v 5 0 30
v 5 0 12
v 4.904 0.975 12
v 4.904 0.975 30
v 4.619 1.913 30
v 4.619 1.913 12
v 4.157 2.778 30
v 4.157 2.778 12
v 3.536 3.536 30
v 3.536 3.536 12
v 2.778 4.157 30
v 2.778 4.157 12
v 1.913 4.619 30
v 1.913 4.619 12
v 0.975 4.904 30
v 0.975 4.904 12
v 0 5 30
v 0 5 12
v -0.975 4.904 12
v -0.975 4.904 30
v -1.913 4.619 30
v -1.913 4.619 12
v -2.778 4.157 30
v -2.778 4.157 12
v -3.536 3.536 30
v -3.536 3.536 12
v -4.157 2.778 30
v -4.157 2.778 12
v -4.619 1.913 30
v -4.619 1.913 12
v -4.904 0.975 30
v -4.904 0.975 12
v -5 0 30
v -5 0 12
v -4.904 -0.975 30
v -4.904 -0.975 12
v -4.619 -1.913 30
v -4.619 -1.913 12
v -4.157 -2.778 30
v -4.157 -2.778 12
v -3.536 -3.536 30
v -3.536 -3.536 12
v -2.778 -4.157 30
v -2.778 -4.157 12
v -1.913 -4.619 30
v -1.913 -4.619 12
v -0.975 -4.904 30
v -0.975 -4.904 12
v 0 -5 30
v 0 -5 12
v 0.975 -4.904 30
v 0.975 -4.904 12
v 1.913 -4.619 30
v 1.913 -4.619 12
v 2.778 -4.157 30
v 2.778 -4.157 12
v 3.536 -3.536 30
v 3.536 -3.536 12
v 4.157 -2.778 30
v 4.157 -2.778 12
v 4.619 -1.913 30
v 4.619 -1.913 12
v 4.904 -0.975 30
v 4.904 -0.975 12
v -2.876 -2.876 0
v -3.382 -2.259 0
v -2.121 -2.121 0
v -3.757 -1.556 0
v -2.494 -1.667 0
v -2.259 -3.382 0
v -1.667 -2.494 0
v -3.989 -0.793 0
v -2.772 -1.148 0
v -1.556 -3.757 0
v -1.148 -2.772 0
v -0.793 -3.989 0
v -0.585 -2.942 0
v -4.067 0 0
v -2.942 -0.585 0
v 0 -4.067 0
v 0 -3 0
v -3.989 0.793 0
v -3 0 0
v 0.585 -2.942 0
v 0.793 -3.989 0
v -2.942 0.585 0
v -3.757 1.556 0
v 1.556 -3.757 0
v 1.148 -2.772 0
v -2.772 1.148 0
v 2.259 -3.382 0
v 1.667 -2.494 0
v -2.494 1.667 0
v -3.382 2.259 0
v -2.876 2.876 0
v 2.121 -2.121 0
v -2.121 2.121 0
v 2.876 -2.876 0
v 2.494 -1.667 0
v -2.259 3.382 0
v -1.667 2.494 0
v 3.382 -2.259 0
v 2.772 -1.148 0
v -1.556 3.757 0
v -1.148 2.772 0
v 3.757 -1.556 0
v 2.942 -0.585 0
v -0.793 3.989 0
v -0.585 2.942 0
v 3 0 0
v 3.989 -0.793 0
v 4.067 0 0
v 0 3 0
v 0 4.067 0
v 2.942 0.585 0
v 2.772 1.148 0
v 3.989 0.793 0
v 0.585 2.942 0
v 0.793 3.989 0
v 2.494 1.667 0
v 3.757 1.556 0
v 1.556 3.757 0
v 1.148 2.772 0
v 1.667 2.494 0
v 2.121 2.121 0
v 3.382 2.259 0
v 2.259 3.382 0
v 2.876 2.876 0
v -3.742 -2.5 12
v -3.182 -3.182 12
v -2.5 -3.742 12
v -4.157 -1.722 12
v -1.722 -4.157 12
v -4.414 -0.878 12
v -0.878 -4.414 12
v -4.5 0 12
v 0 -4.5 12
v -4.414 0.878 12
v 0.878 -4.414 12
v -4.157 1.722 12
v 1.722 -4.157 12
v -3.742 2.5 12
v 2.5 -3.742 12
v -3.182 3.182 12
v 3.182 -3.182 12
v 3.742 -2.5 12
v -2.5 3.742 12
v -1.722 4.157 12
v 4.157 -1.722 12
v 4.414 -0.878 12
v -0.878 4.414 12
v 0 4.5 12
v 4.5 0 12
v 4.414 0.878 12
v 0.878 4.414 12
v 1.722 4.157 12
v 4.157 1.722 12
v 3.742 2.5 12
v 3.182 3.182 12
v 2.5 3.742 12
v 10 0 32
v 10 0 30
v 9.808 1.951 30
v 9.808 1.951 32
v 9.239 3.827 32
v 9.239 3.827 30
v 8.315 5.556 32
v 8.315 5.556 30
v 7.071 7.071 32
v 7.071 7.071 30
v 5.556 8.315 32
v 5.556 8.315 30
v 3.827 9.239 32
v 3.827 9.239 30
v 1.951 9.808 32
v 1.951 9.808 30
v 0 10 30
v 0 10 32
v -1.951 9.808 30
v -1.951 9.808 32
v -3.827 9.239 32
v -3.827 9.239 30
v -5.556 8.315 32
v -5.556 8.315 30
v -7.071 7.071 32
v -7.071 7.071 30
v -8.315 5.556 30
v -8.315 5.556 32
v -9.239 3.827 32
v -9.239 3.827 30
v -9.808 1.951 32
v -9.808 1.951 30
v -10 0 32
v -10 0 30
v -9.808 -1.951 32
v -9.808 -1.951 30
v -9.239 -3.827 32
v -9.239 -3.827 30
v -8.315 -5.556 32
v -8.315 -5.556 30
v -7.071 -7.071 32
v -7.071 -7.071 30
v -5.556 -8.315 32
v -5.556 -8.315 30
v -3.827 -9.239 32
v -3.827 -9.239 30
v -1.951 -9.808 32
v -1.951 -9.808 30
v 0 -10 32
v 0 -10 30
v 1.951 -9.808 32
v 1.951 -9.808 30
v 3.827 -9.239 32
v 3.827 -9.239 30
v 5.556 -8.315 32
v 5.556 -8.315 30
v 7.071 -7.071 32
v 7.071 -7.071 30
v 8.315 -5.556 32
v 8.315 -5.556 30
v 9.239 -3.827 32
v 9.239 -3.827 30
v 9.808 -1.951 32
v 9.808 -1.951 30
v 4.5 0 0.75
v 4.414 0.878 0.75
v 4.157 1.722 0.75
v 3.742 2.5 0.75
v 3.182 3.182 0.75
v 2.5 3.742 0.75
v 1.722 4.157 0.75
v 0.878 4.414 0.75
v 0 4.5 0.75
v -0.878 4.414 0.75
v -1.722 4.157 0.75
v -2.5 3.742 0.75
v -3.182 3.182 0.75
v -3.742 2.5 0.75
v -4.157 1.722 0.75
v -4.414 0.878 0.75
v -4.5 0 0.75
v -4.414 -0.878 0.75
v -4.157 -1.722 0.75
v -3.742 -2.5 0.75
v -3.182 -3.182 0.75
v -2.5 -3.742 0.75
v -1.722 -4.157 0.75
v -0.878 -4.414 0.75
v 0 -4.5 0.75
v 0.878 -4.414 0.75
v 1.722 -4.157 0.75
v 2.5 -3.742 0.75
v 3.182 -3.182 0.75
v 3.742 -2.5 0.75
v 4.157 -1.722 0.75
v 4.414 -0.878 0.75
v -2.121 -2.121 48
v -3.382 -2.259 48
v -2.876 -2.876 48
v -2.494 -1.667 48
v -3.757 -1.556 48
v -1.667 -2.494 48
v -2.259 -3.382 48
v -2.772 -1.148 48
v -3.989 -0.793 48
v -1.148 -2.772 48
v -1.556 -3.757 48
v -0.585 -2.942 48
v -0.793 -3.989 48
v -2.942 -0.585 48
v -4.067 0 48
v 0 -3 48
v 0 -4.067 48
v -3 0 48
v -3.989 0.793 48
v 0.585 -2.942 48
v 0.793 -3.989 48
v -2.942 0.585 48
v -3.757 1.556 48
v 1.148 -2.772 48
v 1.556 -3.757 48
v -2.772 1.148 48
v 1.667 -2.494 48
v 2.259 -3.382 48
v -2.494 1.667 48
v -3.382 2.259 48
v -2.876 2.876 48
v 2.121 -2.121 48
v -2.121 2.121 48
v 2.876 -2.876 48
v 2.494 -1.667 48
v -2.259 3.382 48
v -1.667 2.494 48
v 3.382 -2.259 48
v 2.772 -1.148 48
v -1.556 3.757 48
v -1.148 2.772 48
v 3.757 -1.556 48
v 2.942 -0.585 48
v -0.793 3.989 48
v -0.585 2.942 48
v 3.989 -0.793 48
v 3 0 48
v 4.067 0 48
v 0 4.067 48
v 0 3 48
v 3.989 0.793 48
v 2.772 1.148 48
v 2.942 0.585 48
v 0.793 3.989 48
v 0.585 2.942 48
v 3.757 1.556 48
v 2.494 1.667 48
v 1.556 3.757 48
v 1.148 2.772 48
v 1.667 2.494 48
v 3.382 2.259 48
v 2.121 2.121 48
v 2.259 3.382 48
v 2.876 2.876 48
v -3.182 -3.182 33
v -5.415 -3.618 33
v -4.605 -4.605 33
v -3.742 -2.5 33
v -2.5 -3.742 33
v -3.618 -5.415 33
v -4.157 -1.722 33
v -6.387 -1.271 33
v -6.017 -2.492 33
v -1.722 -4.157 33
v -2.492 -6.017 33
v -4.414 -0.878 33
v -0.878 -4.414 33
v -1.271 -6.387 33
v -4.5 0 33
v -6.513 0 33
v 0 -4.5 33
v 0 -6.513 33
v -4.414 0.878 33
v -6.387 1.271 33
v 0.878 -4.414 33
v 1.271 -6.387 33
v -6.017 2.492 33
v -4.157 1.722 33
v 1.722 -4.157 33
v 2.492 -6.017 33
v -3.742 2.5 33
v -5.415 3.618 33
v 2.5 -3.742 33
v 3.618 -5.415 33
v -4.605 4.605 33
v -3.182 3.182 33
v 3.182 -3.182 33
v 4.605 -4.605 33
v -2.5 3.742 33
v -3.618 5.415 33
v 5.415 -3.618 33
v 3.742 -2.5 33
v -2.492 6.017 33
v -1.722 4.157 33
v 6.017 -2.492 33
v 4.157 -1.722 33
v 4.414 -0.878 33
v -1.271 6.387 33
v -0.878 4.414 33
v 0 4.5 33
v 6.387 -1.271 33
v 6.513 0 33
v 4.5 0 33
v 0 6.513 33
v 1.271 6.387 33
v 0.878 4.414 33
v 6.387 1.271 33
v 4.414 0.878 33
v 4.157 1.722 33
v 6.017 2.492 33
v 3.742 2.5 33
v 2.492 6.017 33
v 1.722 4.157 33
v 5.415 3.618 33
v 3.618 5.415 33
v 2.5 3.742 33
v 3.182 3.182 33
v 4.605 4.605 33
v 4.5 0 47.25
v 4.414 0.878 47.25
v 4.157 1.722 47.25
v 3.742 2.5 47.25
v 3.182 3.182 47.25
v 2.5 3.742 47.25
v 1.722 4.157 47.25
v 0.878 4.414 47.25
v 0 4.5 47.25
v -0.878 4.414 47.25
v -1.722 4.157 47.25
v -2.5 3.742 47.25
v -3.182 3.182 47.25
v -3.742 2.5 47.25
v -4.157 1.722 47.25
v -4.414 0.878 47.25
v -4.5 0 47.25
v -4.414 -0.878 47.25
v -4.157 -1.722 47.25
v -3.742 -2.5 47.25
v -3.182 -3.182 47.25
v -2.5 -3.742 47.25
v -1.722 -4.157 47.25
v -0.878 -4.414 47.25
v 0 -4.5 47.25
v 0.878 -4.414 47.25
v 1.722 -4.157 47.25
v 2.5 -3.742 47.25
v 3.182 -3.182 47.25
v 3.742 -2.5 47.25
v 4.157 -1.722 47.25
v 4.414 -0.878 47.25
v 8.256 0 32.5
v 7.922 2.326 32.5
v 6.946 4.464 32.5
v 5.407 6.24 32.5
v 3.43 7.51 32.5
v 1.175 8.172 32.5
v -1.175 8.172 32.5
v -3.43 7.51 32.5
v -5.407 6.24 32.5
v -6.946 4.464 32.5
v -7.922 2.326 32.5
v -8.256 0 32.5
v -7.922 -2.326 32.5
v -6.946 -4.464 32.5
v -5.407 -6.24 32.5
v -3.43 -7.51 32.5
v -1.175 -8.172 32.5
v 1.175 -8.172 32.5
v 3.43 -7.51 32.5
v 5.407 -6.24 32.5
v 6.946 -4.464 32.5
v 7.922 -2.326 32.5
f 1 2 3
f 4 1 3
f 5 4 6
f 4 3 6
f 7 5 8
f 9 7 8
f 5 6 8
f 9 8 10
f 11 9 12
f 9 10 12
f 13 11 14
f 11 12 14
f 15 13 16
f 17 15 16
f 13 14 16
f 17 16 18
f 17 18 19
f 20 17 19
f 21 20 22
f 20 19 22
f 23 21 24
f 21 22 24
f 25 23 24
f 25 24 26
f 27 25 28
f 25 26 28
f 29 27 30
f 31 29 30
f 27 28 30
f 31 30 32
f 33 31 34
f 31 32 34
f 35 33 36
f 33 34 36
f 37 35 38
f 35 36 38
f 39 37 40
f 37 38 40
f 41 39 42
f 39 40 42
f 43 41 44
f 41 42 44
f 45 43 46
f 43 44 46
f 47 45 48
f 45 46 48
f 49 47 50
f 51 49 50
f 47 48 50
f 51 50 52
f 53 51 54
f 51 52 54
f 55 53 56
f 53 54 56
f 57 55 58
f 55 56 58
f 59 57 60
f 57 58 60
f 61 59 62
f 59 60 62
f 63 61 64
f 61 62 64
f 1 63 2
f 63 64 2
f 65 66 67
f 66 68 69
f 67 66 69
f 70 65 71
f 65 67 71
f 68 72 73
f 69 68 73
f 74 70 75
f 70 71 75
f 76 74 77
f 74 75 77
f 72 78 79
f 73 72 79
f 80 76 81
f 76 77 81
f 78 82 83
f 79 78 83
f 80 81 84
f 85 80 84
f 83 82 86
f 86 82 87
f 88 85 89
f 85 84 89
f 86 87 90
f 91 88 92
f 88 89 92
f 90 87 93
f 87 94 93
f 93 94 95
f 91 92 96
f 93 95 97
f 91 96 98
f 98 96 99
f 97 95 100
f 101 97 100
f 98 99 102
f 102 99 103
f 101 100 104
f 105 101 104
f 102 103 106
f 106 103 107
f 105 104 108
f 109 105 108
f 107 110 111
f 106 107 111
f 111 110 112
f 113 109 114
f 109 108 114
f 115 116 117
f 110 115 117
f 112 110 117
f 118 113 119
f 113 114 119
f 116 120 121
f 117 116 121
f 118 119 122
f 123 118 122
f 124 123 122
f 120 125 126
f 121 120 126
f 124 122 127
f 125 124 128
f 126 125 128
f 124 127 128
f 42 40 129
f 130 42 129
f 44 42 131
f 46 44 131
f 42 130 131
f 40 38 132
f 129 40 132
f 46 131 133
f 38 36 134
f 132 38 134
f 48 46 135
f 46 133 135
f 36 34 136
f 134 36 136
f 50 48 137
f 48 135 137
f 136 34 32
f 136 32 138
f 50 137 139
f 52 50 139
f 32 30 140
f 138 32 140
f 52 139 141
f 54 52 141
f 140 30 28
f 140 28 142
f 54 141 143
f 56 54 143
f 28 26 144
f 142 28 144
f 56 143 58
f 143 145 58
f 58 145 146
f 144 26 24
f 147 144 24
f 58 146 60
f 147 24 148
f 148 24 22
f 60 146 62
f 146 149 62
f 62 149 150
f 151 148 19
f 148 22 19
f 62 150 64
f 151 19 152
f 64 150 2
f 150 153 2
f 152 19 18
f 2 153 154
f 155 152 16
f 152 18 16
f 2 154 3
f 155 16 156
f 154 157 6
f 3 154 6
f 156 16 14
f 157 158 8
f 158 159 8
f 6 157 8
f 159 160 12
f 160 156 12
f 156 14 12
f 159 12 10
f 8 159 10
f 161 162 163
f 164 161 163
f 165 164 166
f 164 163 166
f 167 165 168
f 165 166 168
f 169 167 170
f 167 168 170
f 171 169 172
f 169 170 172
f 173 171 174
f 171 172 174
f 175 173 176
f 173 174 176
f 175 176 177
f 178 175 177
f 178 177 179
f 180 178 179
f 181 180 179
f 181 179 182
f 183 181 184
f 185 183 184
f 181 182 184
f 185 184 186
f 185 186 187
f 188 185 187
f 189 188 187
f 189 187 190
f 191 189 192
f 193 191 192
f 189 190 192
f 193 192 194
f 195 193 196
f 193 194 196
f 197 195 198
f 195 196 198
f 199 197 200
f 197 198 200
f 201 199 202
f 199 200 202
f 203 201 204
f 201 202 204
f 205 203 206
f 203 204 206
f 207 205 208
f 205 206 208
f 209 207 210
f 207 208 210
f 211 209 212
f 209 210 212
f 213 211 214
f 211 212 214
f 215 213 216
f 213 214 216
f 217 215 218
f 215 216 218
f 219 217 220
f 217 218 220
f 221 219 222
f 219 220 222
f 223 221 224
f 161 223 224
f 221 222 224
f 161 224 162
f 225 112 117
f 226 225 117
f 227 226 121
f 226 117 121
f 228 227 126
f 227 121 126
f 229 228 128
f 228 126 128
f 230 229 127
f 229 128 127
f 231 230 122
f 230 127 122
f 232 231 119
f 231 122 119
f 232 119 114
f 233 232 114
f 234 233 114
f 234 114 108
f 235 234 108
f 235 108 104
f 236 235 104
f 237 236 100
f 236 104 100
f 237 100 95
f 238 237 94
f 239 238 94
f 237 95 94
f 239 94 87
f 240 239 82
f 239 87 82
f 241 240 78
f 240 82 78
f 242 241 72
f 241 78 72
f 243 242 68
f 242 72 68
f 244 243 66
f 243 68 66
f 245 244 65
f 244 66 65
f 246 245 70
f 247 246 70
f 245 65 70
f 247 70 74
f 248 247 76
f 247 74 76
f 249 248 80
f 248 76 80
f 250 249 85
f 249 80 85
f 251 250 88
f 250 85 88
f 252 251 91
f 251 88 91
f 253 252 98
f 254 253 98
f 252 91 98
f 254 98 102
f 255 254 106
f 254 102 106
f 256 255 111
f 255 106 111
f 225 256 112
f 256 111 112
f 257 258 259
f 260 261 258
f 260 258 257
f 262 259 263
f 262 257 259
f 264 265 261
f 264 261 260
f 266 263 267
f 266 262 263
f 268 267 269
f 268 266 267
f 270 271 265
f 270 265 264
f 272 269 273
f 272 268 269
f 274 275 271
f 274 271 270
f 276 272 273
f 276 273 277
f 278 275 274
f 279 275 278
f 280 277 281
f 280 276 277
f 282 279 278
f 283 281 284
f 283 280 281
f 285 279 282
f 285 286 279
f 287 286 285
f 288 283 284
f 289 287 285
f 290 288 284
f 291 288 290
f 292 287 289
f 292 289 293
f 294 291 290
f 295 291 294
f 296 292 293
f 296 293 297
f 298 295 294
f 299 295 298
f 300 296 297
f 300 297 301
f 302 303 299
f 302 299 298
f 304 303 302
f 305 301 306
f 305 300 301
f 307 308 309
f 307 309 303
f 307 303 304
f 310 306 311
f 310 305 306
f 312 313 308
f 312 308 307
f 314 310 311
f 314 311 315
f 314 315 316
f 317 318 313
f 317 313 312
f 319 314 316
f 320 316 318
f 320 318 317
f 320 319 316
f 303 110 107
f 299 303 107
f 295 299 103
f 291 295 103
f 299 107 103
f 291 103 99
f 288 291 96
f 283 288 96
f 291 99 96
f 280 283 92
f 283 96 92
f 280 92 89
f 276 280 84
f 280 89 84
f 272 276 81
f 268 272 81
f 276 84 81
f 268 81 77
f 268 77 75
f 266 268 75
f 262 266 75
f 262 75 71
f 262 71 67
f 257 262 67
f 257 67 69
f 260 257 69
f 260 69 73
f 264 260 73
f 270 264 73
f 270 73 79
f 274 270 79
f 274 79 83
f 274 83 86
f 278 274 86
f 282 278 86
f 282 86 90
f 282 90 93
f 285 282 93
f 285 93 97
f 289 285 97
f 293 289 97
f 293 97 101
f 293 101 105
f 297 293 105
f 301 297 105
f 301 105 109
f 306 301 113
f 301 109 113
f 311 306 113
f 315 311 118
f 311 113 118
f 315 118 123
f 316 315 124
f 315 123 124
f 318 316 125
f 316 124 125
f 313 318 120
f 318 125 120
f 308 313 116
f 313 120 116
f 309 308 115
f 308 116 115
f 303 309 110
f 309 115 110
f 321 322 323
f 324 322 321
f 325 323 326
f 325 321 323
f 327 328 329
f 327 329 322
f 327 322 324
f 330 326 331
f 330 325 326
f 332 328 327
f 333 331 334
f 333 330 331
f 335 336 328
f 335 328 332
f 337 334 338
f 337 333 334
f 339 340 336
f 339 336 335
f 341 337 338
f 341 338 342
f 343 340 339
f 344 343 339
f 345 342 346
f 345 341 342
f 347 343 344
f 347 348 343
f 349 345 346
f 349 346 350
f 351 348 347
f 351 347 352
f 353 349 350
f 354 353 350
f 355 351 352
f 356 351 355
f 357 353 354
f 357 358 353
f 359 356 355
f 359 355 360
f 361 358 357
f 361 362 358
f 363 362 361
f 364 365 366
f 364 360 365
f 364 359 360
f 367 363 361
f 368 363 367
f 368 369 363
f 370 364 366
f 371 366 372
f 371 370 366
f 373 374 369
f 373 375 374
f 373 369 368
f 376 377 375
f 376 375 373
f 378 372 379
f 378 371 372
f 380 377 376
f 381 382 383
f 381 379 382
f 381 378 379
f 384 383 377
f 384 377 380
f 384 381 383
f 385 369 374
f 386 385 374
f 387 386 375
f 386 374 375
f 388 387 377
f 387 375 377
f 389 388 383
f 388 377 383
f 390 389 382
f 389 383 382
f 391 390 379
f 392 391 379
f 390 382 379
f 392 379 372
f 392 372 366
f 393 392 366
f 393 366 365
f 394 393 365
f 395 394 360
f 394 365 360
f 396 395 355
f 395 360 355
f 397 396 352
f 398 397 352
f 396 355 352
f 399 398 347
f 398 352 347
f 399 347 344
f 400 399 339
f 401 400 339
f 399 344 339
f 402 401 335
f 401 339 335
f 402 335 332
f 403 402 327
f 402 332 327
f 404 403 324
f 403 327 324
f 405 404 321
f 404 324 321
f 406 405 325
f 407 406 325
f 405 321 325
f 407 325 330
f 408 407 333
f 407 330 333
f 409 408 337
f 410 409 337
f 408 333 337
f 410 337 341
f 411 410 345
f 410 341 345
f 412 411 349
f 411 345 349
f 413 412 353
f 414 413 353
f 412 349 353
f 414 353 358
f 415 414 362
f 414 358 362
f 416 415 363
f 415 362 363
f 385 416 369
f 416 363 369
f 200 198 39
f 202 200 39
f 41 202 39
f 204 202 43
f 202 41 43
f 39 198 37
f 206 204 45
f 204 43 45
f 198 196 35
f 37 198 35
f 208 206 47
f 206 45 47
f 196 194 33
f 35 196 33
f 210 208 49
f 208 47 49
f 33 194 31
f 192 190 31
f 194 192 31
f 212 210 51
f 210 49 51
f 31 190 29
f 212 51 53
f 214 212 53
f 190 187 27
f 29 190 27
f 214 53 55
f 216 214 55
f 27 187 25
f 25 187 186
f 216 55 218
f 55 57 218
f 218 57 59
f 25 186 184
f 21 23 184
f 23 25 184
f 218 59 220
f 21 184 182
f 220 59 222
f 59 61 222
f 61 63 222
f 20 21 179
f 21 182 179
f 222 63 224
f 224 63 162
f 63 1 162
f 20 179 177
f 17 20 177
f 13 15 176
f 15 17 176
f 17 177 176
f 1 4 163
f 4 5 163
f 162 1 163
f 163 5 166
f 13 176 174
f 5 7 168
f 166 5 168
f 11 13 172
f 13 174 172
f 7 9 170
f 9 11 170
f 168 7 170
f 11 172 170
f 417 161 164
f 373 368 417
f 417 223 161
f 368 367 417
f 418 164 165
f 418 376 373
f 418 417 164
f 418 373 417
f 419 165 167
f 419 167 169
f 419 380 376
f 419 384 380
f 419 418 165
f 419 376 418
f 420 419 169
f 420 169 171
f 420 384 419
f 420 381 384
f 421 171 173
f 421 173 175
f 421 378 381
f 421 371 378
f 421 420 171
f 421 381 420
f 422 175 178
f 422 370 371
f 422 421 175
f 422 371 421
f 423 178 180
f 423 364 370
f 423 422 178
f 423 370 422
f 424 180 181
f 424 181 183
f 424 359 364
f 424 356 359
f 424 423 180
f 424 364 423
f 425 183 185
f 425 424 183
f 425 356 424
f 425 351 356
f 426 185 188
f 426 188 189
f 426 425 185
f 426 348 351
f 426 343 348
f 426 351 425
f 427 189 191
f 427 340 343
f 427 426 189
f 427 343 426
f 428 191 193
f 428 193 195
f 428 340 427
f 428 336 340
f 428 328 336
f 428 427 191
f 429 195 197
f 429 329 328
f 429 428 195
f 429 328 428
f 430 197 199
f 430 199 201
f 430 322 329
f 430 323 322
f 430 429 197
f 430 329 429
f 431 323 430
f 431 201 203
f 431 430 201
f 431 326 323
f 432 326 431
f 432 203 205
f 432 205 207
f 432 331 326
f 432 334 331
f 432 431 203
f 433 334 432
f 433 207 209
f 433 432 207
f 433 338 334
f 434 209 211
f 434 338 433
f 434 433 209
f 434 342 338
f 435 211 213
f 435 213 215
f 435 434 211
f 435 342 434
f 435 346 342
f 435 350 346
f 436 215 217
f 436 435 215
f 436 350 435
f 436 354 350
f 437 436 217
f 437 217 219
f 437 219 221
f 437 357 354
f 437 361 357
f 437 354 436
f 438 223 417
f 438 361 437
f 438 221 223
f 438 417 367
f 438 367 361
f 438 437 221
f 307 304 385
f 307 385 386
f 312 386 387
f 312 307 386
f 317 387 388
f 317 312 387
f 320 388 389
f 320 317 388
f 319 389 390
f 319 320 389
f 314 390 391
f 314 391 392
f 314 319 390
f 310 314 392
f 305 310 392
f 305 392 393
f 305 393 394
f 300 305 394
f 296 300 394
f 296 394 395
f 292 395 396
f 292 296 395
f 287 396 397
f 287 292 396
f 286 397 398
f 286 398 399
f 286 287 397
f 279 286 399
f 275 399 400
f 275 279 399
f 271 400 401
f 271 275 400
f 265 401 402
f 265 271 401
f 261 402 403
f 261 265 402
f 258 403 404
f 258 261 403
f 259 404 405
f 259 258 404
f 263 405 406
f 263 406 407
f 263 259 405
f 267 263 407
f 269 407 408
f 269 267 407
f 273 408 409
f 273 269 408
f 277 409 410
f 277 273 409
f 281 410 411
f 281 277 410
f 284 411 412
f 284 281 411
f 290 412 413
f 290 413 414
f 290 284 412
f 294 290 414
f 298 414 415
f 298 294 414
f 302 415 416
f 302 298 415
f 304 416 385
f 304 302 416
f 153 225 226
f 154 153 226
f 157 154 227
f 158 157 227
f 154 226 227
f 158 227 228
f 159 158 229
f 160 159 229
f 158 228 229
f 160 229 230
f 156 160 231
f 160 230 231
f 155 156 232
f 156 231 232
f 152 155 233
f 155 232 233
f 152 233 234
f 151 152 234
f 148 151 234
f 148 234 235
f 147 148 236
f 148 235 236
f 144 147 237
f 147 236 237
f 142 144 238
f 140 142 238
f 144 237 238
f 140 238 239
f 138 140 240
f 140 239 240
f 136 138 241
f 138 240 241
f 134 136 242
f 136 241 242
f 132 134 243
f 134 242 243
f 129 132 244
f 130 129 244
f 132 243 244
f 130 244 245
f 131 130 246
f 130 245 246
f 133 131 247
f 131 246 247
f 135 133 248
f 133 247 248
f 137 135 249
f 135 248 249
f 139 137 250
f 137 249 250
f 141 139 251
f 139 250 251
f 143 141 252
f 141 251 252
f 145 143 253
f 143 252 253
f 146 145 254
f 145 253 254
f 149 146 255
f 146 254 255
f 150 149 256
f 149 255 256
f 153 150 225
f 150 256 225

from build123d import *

# Parameters (mm, degrees)
F0_R      = 4.5
F1_DEPTH  = 12
F2_R      = 5
F3_DEPTH  = 18
F4_R      = 10
F5_DEPTH  = 3
F6_R      = 4.5
F7_DEPTH  = 15
F8_R      = 3
F9_DEPTH  = 48.001
F10_SIZE2 = 0.4330127019
F10_SIZE  = 0.75
F11_SIZE2 = 0.4330127019
F11_SIZE  = 0.75
F12_SIZE2 = 3.4874144438
F12_SIZE  = 1


with BuildPart() as f1:
    # F0 (on Top) → F1 (new body)
    with BuildSketch(Plane.XY):
        Circle(F0_R)
    extrude(amount=F1_DEPTH)

    # F2 (on face) → F3 (join)
    with BuildSketch(Plane.XY.offset(12)):
        Circle(F2_R)
    extrude(amount=F3_DEPTH)

    # F4 (on face) → F5 (join)
    with BuildSketch(Plane.XY.offset(30)):
        Circle(F4_R)
    extrude(amount=F5_DEPTH)

    # F6 (on face) → F7 (join)
    with BuildSketch(Plane.XY.offset(33)):
        Circle(F6_R)
    extrude(amount=F7_DEPTH)

    # F8 (on face) → F9 (cut, through all)
    with BuildSketch(Plane(origin=(0, 0, 0), x_dir=(1, 0, 0), z_dir=(0, 0, -1))):
        Circle(F8_R)
    extrude(amount=-F9_DEPTH, mode=Mode.SUBTRACT)

    # F10
    f10_edges = [f1.edges().sort_by_distance(p)[0] for p in [
        (-4.5, 0, 48),
    ]]
    f10_side = f1.faces().sort_by_distance((-4.5, 0, 40.5))[0]
    chamfer(f10_edges, length=F10_SIZE, length2=F10_SIZE2, reference=f10_side)

    # F11
    f11_edges = [f1.edges().sort_by_distance(p)[0] for p in [
        (-4.5, 0, 0),
    ]]
    f11_side = f1.faces().sort_by_distance((-4.5, 0, 6))[0]
    chamfer(f11_edges, length=F11_SIZE, length2=F11_SIZE2, reference=f11_side)

    # F12
    f12_edges = [f1.edges().sort_by_distance(p)[0] for p in [
        (-10, 0, 33),
    ]]
    f12_side = f1.faces().sort_by_distance((-10, 0, 31.5))[0]
    chamfer(f12_edges, length=F12_SIZE, length2=F12_SIZE2, reference=f12_side)


solid = f1.part
